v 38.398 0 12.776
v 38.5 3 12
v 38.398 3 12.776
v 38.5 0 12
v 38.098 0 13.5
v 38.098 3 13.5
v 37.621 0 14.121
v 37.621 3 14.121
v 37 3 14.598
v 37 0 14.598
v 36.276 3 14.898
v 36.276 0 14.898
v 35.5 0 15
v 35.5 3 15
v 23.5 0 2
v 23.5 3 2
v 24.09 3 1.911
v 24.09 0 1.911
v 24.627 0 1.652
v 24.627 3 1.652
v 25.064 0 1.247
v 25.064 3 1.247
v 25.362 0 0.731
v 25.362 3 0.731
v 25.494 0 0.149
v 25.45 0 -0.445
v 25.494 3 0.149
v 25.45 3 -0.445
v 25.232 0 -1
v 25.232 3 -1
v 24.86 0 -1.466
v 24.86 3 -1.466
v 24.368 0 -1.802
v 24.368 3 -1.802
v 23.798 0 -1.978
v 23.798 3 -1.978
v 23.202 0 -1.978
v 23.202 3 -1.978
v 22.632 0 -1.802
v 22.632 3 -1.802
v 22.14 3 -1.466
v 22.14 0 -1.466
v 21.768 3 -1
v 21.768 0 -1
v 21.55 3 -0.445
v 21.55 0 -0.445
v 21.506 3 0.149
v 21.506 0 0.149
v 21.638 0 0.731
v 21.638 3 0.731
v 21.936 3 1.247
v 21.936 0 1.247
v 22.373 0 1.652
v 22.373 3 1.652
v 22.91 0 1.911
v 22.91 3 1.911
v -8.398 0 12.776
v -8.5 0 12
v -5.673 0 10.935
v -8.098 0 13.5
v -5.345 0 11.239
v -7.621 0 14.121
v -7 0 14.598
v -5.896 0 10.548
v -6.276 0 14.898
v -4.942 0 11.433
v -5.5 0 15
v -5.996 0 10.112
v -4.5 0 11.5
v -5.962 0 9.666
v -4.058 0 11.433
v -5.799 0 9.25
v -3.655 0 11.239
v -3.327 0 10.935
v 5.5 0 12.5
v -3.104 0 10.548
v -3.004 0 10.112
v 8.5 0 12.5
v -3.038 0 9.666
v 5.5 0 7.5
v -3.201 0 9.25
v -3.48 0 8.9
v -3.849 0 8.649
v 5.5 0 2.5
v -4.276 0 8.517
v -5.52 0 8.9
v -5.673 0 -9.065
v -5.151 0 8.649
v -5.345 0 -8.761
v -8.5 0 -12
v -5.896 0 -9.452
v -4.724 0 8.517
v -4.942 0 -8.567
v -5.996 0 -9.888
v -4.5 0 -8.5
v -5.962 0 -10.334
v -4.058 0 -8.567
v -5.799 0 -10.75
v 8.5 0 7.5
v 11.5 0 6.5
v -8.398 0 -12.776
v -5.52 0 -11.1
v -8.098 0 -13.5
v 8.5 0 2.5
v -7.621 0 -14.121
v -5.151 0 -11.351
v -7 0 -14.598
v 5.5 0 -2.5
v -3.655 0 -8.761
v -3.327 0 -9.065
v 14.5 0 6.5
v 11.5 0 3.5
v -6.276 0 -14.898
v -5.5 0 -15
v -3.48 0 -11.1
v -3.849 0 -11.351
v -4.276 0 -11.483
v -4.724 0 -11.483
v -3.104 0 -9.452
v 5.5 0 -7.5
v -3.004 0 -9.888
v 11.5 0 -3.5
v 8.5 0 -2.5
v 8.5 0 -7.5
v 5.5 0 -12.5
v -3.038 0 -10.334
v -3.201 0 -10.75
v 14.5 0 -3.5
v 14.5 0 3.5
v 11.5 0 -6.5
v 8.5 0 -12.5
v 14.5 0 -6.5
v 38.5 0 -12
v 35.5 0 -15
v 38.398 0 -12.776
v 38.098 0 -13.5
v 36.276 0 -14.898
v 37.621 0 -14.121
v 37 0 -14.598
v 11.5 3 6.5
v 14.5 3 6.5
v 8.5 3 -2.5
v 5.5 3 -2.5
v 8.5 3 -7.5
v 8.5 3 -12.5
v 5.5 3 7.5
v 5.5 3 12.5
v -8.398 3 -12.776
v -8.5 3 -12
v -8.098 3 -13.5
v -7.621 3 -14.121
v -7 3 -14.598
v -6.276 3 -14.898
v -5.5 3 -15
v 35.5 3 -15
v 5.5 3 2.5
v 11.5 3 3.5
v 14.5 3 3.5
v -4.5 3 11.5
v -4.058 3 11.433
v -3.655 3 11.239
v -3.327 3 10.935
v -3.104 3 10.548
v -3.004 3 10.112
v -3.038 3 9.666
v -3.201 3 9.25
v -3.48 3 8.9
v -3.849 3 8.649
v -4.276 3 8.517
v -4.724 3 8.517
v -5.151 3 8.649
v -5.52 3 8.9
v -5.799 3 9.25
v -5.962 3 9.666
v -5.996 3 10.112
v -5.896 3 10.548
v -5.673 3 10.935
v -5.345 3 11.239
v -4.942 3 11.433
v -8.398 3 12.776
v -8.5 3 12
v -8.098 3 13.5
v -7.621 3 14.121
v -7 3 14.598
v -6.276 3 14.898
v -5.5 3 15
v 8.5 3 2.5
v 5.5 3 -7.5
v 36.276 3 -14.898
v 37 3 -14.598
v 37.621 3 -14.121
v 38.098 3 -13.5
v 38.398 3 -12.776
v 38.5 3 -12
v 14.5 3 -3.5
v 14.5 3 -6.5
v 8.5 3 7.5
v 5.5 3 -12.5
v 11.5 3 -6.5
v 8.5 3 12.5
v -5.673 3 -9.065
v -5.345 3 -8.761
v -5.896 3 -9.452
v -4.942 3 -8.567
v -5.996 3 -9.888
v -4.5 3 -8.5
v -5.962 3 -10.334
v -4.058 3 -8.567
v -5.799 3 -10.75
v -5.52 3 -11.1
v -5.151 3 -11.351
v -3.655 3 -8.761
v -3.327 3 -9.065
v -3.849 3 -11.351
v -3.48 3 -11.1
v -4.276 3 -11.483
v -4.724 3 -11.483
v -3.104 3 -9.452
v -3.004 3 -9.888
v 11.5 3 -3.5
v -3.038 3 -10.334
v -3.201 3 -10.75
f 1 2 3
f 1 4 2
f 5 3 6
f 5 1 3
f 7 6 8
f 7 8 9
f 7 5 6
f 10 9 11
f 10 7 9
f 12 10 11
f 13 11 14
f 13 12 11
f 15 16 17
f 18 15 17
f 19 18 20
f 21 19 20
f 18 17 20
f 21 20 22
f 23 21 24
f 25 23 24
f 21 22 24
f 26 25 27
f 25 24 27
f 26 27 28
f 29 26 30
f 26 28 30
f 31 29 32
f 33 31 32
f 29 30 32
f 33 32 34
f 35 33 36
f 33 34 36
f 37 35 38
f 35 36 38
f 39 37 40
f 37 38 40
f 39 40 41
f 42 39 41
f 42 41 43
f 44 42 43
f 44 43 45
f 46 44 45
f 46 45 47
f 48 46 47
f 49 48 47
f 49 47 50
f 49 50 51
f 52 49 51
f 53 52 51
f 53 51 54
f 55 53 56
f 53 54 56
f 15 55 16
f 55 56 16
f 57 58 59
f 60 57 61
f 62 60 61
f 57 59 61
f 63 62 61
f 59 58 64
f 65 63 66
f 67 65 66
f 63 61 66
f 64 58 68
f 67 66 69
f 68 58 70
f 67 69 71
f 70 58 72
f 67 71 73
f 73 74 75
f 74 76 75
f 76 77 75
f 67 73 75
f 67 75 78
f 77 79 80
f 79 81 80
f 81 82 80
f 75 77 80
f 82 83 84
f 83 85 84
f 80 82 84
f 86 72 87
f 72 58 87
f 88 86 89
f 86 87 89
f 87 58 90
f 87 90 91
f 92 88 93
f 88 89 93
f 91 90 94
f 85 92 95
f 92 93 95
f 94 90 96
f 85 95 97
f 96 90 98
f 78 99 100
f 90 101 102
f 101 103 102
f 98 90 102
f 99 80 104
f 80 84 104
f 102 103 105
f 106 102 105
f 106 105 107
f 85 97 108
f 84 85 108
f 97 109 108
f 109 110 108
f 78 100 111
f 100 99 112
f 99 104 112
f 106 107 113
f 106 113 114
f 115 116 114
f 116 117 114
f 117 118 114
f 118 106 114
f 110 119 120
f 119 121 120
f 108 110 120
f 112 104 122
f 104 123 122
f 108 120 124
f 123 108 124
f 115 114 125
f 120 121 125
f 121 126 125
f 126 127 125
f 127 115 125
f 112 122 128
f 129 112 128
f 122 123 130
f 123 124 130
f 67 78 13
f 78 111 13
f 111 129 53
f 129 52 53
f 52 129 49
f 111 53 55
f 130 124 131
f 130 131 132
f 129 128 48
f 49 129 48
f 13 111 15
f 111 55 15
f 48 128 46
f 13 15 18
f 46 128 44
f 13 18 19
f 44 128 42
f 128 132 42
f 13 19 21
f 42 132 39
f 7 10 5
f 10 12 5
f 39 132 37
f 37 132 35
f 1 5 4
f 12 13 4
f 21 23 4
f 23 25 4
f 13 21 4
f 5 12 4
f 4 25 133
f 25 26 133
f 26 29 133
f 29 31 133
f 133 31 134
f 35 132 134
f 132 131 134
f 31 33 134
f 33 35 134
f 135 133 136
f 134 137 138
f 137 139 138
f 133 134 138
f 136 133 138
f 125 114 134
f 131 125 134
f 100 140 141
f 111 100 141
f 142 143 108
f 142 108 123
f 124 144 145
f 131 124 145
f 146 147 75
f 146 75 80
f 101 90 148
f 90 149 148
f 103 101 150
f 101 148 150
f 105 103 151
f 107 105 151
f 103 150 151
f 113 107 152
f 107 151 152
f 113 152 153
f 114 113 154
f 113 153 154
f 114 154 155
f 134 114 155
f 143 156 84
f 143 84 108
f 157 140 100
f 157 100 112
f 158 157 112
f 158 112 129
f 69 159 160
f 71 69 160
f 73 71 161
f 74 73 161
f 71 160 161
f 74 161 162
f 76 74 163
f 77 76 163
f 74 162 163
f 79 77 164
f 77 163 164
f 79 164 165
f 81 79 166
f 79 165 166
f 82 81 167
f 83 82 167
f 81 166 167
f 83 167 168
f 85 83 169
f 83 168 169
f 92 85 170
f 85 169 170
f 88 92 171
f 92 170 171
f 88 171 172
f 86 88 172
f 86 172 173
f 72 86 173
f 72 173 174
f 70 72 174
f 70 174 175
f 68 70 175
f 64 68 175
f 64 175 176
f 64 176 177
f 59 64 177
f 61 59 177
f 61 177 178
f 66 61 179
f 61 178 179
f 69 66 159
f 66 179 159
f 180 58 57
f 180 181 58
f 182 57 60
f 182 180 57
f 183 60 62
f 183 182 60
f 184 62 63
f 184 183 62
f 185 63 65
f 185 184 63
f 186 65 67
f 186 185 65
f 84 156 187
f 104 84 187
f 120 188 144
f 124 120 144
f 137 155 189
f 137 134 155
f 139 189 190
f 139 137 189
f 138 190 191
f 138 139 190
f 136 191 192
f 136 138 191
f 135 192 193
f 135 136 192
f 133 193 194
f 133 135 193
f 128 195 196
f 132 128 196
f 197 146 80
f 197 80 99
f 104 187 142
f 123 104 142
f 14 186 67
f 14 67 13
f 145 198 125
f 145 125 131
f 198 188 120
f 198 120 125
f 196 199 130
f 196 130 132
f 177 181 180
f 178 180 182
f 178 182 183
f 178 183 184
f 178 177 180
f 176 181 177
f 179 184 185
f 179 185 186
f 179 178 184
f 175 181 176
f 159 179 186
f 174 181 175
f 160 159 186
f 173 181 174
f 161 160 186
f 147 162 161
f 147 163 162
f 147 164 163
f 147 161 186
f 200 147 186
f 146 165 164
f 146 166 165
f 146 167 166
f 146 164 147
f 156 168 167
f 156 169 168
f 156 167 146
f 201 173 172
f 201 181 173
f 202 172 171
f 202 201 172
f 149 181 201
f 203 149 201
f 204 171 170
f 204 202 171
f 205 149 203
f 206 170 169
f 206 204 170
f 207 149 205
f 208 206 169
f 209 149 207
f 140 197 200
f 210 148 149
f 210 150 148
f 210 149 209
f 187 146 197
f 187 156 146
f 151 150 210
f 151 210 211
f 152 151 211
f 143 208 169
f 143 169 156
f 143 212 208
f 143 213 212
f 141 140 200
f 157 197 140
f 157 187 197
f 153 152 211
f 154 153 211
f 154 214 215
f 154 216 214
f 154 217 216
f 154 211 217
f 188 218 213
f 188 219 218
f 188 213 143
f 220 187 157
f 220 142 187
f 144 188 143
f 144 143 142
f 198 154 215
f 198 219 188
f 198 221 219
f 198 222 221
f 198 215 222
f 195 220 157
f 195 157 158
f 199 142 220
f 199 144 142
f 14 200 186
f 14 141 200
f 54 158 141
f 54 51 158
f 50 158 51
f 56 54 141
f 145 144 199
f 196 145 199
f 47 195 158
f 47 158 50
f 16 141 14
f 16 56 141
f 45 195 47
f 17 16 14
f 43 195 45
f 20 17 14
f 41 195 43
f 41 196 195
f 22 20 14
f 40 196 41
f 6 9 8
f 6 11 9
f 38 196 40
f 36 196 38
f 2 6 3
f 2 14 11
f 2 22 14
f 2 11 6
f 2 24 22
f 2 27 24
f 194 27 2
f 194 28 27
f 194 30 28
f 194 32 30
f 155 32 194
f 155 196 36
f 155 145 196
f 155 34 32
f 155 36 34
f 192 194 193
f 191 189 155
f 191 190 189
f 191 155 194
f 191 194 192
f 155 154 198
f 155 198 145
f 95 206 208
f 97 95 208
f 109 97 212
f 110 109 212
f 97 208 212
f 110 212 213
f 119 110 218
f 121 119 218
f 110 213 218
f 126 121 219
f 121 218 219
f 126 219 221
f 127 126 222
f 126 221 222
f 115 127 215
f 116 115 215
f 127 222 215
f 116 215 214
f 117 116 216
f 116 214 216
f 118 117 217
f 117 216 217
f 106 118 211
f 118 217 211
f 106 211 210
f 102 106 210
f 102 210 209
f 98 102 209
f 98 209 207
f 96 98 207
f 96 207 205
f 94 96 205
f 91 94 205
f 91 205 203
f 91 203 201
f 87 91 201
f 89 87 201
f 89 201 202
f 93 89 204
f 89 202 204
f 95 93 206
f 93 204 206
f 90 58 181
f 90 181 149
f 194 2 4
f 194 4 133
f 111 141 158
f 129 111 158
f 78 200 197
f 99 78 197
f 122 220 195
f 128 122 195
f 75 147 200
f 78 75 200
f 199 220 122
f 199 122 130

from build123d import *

# Parameters (mm, degrees)
SKETCH1_W           = 17
SKETCH1_H           = 30
BOSS_EXTRUDE1_DEPTH = 3
SKETCH2_W           = 3
SKETCH2_H           = 5
CUT_EXTRUDE1_DEPTH  = 3
SKETCH3_R           = 1.5
CUT_EXTRUDE2_DEPTH  = 3
FILLET1_R           = 3
SKETCH4_W           = 30
SKETCH4_H           = 30
BOSS_EXTRUDE2_DEPTH = 3
FILLET2_R           = 3
SKETCH5_R           = 2
CUT_EXTRUDE3_DEPTH  = 3
SKETCH6_W           = 3
SKETCH6_H           = 3
CUT_EXTRUDE4_DEPTH  = 10


with BuildPart() as part:
    # Sketch1 → Boss-Extrude1 (new body)
    with BuildSketch(Plane(origin=(0, 0, 0), x_dir=(1, 0, 0), z_dir=(0, 1, 0))):
        Rectangle(SKETCH1_W, SKETCH1_H)
    extrude(amount=BOSS_EXTRUDE1_DEPTH)

    # Sketch2 → Cut-Extrude1 (cut)
    with BuildSketch(Plane(origin=(0, 3, 0), x_dir=(1, 0, 0), z_dir=(0, 1, 0))):
        with Locations((7, 10)):
            Rectangle(SKETCH2_W, SKETCH2_H)
        with Locations((7, 0)):
            Rectangle(SKETCH2_W, SKETCH2_H)
        with Locations((7, -10)):
            Rectangle(SKETCH2_W, SKETCH2_H)
    extrude(amount=-CUT_EXTRUDE1_DEPTH, mode=Mode.SUBTRACT)

    # Sketch3 → Cut-Extrude2 (cut)
    with BuildSketch(Plane(origin=(0, 3, 0), x_dir=(1, 0, 0), z_dir=(0, 1, 0))):
        with Locations(Location((-4.5, 10, 0), (0, 0, 270))):
            Circle(SKETCH3_R)
        with Locations(Location((-4.5, -10, 0), (0, 0, 270))):
            Circle(SKETCH3_R)
    extrude(amount=-CUT_EXTRUDE2_DEPTH, mode=Mode.SUBTRACT)

    # Fillet1
    fillet1_edges = [part.edges().sort_by_distance(p)[0] for p in [
        (-8.5, 1.5, 15),
        (-8.5, 1.5, -15),
    ]]
    fillet(fillet1_edges, radius=FILLET1_R)

    # Sketch4 → Boss-Extrude2 (add)
    with BuildSketch(Plane(origin=(0, 3, 0), x_dir=(1, 0, 0), z_dir=(0, 1, 0))):
        with Locations((23.5, 0)):
            Rectangle(SKETCH4_W, SKETCH4_H)
    extrude(amount=-BOSS_EXTRUDE2_DEPTH)

    # Fillet2
    fillet2_edges = [part.edges().sort_by_distance(p)[0] for p in [
        (38.5, 1.5, 15),
        (38.5, 1.5, -15),
    ]]
    fillet(fillet2_edges, radius=FILLET2_R)

    # Sketch5 → Cut-Extrude3 (cut)
    with BuildSketch(Plane(origin=(0, 3, 0), x_dir=(1, 0, 0), z_dir=(0, 1, 0))):
        with Locations(Location((23.5, 0, 0), (0, 0, 270))):
            Circle(SKETCH5_R)
    extrude(amount=-CUT_EXTRUDE3_DEPTH, mode=Mode.SUBTRACT)

    # Sketch6 → Cut-Extrude4 (cut)
    with BuildSketch(Plane(origin=(0, 3, 0), x_dir=(1, 0, 0), z_dir=(0, 1, 0))):
        with Locations((13, 5)):
            Rectangle(SKETCH6_W, SKETCH6_H)
        with Locations((13, -5)):
            Rectangle(SKETCH6_W, SKETCH6_H)
    extrude(amount=-CUT_EXTRUDE4_DEPTH, mode=Mode.SUBTRACT)


solid = part.part
